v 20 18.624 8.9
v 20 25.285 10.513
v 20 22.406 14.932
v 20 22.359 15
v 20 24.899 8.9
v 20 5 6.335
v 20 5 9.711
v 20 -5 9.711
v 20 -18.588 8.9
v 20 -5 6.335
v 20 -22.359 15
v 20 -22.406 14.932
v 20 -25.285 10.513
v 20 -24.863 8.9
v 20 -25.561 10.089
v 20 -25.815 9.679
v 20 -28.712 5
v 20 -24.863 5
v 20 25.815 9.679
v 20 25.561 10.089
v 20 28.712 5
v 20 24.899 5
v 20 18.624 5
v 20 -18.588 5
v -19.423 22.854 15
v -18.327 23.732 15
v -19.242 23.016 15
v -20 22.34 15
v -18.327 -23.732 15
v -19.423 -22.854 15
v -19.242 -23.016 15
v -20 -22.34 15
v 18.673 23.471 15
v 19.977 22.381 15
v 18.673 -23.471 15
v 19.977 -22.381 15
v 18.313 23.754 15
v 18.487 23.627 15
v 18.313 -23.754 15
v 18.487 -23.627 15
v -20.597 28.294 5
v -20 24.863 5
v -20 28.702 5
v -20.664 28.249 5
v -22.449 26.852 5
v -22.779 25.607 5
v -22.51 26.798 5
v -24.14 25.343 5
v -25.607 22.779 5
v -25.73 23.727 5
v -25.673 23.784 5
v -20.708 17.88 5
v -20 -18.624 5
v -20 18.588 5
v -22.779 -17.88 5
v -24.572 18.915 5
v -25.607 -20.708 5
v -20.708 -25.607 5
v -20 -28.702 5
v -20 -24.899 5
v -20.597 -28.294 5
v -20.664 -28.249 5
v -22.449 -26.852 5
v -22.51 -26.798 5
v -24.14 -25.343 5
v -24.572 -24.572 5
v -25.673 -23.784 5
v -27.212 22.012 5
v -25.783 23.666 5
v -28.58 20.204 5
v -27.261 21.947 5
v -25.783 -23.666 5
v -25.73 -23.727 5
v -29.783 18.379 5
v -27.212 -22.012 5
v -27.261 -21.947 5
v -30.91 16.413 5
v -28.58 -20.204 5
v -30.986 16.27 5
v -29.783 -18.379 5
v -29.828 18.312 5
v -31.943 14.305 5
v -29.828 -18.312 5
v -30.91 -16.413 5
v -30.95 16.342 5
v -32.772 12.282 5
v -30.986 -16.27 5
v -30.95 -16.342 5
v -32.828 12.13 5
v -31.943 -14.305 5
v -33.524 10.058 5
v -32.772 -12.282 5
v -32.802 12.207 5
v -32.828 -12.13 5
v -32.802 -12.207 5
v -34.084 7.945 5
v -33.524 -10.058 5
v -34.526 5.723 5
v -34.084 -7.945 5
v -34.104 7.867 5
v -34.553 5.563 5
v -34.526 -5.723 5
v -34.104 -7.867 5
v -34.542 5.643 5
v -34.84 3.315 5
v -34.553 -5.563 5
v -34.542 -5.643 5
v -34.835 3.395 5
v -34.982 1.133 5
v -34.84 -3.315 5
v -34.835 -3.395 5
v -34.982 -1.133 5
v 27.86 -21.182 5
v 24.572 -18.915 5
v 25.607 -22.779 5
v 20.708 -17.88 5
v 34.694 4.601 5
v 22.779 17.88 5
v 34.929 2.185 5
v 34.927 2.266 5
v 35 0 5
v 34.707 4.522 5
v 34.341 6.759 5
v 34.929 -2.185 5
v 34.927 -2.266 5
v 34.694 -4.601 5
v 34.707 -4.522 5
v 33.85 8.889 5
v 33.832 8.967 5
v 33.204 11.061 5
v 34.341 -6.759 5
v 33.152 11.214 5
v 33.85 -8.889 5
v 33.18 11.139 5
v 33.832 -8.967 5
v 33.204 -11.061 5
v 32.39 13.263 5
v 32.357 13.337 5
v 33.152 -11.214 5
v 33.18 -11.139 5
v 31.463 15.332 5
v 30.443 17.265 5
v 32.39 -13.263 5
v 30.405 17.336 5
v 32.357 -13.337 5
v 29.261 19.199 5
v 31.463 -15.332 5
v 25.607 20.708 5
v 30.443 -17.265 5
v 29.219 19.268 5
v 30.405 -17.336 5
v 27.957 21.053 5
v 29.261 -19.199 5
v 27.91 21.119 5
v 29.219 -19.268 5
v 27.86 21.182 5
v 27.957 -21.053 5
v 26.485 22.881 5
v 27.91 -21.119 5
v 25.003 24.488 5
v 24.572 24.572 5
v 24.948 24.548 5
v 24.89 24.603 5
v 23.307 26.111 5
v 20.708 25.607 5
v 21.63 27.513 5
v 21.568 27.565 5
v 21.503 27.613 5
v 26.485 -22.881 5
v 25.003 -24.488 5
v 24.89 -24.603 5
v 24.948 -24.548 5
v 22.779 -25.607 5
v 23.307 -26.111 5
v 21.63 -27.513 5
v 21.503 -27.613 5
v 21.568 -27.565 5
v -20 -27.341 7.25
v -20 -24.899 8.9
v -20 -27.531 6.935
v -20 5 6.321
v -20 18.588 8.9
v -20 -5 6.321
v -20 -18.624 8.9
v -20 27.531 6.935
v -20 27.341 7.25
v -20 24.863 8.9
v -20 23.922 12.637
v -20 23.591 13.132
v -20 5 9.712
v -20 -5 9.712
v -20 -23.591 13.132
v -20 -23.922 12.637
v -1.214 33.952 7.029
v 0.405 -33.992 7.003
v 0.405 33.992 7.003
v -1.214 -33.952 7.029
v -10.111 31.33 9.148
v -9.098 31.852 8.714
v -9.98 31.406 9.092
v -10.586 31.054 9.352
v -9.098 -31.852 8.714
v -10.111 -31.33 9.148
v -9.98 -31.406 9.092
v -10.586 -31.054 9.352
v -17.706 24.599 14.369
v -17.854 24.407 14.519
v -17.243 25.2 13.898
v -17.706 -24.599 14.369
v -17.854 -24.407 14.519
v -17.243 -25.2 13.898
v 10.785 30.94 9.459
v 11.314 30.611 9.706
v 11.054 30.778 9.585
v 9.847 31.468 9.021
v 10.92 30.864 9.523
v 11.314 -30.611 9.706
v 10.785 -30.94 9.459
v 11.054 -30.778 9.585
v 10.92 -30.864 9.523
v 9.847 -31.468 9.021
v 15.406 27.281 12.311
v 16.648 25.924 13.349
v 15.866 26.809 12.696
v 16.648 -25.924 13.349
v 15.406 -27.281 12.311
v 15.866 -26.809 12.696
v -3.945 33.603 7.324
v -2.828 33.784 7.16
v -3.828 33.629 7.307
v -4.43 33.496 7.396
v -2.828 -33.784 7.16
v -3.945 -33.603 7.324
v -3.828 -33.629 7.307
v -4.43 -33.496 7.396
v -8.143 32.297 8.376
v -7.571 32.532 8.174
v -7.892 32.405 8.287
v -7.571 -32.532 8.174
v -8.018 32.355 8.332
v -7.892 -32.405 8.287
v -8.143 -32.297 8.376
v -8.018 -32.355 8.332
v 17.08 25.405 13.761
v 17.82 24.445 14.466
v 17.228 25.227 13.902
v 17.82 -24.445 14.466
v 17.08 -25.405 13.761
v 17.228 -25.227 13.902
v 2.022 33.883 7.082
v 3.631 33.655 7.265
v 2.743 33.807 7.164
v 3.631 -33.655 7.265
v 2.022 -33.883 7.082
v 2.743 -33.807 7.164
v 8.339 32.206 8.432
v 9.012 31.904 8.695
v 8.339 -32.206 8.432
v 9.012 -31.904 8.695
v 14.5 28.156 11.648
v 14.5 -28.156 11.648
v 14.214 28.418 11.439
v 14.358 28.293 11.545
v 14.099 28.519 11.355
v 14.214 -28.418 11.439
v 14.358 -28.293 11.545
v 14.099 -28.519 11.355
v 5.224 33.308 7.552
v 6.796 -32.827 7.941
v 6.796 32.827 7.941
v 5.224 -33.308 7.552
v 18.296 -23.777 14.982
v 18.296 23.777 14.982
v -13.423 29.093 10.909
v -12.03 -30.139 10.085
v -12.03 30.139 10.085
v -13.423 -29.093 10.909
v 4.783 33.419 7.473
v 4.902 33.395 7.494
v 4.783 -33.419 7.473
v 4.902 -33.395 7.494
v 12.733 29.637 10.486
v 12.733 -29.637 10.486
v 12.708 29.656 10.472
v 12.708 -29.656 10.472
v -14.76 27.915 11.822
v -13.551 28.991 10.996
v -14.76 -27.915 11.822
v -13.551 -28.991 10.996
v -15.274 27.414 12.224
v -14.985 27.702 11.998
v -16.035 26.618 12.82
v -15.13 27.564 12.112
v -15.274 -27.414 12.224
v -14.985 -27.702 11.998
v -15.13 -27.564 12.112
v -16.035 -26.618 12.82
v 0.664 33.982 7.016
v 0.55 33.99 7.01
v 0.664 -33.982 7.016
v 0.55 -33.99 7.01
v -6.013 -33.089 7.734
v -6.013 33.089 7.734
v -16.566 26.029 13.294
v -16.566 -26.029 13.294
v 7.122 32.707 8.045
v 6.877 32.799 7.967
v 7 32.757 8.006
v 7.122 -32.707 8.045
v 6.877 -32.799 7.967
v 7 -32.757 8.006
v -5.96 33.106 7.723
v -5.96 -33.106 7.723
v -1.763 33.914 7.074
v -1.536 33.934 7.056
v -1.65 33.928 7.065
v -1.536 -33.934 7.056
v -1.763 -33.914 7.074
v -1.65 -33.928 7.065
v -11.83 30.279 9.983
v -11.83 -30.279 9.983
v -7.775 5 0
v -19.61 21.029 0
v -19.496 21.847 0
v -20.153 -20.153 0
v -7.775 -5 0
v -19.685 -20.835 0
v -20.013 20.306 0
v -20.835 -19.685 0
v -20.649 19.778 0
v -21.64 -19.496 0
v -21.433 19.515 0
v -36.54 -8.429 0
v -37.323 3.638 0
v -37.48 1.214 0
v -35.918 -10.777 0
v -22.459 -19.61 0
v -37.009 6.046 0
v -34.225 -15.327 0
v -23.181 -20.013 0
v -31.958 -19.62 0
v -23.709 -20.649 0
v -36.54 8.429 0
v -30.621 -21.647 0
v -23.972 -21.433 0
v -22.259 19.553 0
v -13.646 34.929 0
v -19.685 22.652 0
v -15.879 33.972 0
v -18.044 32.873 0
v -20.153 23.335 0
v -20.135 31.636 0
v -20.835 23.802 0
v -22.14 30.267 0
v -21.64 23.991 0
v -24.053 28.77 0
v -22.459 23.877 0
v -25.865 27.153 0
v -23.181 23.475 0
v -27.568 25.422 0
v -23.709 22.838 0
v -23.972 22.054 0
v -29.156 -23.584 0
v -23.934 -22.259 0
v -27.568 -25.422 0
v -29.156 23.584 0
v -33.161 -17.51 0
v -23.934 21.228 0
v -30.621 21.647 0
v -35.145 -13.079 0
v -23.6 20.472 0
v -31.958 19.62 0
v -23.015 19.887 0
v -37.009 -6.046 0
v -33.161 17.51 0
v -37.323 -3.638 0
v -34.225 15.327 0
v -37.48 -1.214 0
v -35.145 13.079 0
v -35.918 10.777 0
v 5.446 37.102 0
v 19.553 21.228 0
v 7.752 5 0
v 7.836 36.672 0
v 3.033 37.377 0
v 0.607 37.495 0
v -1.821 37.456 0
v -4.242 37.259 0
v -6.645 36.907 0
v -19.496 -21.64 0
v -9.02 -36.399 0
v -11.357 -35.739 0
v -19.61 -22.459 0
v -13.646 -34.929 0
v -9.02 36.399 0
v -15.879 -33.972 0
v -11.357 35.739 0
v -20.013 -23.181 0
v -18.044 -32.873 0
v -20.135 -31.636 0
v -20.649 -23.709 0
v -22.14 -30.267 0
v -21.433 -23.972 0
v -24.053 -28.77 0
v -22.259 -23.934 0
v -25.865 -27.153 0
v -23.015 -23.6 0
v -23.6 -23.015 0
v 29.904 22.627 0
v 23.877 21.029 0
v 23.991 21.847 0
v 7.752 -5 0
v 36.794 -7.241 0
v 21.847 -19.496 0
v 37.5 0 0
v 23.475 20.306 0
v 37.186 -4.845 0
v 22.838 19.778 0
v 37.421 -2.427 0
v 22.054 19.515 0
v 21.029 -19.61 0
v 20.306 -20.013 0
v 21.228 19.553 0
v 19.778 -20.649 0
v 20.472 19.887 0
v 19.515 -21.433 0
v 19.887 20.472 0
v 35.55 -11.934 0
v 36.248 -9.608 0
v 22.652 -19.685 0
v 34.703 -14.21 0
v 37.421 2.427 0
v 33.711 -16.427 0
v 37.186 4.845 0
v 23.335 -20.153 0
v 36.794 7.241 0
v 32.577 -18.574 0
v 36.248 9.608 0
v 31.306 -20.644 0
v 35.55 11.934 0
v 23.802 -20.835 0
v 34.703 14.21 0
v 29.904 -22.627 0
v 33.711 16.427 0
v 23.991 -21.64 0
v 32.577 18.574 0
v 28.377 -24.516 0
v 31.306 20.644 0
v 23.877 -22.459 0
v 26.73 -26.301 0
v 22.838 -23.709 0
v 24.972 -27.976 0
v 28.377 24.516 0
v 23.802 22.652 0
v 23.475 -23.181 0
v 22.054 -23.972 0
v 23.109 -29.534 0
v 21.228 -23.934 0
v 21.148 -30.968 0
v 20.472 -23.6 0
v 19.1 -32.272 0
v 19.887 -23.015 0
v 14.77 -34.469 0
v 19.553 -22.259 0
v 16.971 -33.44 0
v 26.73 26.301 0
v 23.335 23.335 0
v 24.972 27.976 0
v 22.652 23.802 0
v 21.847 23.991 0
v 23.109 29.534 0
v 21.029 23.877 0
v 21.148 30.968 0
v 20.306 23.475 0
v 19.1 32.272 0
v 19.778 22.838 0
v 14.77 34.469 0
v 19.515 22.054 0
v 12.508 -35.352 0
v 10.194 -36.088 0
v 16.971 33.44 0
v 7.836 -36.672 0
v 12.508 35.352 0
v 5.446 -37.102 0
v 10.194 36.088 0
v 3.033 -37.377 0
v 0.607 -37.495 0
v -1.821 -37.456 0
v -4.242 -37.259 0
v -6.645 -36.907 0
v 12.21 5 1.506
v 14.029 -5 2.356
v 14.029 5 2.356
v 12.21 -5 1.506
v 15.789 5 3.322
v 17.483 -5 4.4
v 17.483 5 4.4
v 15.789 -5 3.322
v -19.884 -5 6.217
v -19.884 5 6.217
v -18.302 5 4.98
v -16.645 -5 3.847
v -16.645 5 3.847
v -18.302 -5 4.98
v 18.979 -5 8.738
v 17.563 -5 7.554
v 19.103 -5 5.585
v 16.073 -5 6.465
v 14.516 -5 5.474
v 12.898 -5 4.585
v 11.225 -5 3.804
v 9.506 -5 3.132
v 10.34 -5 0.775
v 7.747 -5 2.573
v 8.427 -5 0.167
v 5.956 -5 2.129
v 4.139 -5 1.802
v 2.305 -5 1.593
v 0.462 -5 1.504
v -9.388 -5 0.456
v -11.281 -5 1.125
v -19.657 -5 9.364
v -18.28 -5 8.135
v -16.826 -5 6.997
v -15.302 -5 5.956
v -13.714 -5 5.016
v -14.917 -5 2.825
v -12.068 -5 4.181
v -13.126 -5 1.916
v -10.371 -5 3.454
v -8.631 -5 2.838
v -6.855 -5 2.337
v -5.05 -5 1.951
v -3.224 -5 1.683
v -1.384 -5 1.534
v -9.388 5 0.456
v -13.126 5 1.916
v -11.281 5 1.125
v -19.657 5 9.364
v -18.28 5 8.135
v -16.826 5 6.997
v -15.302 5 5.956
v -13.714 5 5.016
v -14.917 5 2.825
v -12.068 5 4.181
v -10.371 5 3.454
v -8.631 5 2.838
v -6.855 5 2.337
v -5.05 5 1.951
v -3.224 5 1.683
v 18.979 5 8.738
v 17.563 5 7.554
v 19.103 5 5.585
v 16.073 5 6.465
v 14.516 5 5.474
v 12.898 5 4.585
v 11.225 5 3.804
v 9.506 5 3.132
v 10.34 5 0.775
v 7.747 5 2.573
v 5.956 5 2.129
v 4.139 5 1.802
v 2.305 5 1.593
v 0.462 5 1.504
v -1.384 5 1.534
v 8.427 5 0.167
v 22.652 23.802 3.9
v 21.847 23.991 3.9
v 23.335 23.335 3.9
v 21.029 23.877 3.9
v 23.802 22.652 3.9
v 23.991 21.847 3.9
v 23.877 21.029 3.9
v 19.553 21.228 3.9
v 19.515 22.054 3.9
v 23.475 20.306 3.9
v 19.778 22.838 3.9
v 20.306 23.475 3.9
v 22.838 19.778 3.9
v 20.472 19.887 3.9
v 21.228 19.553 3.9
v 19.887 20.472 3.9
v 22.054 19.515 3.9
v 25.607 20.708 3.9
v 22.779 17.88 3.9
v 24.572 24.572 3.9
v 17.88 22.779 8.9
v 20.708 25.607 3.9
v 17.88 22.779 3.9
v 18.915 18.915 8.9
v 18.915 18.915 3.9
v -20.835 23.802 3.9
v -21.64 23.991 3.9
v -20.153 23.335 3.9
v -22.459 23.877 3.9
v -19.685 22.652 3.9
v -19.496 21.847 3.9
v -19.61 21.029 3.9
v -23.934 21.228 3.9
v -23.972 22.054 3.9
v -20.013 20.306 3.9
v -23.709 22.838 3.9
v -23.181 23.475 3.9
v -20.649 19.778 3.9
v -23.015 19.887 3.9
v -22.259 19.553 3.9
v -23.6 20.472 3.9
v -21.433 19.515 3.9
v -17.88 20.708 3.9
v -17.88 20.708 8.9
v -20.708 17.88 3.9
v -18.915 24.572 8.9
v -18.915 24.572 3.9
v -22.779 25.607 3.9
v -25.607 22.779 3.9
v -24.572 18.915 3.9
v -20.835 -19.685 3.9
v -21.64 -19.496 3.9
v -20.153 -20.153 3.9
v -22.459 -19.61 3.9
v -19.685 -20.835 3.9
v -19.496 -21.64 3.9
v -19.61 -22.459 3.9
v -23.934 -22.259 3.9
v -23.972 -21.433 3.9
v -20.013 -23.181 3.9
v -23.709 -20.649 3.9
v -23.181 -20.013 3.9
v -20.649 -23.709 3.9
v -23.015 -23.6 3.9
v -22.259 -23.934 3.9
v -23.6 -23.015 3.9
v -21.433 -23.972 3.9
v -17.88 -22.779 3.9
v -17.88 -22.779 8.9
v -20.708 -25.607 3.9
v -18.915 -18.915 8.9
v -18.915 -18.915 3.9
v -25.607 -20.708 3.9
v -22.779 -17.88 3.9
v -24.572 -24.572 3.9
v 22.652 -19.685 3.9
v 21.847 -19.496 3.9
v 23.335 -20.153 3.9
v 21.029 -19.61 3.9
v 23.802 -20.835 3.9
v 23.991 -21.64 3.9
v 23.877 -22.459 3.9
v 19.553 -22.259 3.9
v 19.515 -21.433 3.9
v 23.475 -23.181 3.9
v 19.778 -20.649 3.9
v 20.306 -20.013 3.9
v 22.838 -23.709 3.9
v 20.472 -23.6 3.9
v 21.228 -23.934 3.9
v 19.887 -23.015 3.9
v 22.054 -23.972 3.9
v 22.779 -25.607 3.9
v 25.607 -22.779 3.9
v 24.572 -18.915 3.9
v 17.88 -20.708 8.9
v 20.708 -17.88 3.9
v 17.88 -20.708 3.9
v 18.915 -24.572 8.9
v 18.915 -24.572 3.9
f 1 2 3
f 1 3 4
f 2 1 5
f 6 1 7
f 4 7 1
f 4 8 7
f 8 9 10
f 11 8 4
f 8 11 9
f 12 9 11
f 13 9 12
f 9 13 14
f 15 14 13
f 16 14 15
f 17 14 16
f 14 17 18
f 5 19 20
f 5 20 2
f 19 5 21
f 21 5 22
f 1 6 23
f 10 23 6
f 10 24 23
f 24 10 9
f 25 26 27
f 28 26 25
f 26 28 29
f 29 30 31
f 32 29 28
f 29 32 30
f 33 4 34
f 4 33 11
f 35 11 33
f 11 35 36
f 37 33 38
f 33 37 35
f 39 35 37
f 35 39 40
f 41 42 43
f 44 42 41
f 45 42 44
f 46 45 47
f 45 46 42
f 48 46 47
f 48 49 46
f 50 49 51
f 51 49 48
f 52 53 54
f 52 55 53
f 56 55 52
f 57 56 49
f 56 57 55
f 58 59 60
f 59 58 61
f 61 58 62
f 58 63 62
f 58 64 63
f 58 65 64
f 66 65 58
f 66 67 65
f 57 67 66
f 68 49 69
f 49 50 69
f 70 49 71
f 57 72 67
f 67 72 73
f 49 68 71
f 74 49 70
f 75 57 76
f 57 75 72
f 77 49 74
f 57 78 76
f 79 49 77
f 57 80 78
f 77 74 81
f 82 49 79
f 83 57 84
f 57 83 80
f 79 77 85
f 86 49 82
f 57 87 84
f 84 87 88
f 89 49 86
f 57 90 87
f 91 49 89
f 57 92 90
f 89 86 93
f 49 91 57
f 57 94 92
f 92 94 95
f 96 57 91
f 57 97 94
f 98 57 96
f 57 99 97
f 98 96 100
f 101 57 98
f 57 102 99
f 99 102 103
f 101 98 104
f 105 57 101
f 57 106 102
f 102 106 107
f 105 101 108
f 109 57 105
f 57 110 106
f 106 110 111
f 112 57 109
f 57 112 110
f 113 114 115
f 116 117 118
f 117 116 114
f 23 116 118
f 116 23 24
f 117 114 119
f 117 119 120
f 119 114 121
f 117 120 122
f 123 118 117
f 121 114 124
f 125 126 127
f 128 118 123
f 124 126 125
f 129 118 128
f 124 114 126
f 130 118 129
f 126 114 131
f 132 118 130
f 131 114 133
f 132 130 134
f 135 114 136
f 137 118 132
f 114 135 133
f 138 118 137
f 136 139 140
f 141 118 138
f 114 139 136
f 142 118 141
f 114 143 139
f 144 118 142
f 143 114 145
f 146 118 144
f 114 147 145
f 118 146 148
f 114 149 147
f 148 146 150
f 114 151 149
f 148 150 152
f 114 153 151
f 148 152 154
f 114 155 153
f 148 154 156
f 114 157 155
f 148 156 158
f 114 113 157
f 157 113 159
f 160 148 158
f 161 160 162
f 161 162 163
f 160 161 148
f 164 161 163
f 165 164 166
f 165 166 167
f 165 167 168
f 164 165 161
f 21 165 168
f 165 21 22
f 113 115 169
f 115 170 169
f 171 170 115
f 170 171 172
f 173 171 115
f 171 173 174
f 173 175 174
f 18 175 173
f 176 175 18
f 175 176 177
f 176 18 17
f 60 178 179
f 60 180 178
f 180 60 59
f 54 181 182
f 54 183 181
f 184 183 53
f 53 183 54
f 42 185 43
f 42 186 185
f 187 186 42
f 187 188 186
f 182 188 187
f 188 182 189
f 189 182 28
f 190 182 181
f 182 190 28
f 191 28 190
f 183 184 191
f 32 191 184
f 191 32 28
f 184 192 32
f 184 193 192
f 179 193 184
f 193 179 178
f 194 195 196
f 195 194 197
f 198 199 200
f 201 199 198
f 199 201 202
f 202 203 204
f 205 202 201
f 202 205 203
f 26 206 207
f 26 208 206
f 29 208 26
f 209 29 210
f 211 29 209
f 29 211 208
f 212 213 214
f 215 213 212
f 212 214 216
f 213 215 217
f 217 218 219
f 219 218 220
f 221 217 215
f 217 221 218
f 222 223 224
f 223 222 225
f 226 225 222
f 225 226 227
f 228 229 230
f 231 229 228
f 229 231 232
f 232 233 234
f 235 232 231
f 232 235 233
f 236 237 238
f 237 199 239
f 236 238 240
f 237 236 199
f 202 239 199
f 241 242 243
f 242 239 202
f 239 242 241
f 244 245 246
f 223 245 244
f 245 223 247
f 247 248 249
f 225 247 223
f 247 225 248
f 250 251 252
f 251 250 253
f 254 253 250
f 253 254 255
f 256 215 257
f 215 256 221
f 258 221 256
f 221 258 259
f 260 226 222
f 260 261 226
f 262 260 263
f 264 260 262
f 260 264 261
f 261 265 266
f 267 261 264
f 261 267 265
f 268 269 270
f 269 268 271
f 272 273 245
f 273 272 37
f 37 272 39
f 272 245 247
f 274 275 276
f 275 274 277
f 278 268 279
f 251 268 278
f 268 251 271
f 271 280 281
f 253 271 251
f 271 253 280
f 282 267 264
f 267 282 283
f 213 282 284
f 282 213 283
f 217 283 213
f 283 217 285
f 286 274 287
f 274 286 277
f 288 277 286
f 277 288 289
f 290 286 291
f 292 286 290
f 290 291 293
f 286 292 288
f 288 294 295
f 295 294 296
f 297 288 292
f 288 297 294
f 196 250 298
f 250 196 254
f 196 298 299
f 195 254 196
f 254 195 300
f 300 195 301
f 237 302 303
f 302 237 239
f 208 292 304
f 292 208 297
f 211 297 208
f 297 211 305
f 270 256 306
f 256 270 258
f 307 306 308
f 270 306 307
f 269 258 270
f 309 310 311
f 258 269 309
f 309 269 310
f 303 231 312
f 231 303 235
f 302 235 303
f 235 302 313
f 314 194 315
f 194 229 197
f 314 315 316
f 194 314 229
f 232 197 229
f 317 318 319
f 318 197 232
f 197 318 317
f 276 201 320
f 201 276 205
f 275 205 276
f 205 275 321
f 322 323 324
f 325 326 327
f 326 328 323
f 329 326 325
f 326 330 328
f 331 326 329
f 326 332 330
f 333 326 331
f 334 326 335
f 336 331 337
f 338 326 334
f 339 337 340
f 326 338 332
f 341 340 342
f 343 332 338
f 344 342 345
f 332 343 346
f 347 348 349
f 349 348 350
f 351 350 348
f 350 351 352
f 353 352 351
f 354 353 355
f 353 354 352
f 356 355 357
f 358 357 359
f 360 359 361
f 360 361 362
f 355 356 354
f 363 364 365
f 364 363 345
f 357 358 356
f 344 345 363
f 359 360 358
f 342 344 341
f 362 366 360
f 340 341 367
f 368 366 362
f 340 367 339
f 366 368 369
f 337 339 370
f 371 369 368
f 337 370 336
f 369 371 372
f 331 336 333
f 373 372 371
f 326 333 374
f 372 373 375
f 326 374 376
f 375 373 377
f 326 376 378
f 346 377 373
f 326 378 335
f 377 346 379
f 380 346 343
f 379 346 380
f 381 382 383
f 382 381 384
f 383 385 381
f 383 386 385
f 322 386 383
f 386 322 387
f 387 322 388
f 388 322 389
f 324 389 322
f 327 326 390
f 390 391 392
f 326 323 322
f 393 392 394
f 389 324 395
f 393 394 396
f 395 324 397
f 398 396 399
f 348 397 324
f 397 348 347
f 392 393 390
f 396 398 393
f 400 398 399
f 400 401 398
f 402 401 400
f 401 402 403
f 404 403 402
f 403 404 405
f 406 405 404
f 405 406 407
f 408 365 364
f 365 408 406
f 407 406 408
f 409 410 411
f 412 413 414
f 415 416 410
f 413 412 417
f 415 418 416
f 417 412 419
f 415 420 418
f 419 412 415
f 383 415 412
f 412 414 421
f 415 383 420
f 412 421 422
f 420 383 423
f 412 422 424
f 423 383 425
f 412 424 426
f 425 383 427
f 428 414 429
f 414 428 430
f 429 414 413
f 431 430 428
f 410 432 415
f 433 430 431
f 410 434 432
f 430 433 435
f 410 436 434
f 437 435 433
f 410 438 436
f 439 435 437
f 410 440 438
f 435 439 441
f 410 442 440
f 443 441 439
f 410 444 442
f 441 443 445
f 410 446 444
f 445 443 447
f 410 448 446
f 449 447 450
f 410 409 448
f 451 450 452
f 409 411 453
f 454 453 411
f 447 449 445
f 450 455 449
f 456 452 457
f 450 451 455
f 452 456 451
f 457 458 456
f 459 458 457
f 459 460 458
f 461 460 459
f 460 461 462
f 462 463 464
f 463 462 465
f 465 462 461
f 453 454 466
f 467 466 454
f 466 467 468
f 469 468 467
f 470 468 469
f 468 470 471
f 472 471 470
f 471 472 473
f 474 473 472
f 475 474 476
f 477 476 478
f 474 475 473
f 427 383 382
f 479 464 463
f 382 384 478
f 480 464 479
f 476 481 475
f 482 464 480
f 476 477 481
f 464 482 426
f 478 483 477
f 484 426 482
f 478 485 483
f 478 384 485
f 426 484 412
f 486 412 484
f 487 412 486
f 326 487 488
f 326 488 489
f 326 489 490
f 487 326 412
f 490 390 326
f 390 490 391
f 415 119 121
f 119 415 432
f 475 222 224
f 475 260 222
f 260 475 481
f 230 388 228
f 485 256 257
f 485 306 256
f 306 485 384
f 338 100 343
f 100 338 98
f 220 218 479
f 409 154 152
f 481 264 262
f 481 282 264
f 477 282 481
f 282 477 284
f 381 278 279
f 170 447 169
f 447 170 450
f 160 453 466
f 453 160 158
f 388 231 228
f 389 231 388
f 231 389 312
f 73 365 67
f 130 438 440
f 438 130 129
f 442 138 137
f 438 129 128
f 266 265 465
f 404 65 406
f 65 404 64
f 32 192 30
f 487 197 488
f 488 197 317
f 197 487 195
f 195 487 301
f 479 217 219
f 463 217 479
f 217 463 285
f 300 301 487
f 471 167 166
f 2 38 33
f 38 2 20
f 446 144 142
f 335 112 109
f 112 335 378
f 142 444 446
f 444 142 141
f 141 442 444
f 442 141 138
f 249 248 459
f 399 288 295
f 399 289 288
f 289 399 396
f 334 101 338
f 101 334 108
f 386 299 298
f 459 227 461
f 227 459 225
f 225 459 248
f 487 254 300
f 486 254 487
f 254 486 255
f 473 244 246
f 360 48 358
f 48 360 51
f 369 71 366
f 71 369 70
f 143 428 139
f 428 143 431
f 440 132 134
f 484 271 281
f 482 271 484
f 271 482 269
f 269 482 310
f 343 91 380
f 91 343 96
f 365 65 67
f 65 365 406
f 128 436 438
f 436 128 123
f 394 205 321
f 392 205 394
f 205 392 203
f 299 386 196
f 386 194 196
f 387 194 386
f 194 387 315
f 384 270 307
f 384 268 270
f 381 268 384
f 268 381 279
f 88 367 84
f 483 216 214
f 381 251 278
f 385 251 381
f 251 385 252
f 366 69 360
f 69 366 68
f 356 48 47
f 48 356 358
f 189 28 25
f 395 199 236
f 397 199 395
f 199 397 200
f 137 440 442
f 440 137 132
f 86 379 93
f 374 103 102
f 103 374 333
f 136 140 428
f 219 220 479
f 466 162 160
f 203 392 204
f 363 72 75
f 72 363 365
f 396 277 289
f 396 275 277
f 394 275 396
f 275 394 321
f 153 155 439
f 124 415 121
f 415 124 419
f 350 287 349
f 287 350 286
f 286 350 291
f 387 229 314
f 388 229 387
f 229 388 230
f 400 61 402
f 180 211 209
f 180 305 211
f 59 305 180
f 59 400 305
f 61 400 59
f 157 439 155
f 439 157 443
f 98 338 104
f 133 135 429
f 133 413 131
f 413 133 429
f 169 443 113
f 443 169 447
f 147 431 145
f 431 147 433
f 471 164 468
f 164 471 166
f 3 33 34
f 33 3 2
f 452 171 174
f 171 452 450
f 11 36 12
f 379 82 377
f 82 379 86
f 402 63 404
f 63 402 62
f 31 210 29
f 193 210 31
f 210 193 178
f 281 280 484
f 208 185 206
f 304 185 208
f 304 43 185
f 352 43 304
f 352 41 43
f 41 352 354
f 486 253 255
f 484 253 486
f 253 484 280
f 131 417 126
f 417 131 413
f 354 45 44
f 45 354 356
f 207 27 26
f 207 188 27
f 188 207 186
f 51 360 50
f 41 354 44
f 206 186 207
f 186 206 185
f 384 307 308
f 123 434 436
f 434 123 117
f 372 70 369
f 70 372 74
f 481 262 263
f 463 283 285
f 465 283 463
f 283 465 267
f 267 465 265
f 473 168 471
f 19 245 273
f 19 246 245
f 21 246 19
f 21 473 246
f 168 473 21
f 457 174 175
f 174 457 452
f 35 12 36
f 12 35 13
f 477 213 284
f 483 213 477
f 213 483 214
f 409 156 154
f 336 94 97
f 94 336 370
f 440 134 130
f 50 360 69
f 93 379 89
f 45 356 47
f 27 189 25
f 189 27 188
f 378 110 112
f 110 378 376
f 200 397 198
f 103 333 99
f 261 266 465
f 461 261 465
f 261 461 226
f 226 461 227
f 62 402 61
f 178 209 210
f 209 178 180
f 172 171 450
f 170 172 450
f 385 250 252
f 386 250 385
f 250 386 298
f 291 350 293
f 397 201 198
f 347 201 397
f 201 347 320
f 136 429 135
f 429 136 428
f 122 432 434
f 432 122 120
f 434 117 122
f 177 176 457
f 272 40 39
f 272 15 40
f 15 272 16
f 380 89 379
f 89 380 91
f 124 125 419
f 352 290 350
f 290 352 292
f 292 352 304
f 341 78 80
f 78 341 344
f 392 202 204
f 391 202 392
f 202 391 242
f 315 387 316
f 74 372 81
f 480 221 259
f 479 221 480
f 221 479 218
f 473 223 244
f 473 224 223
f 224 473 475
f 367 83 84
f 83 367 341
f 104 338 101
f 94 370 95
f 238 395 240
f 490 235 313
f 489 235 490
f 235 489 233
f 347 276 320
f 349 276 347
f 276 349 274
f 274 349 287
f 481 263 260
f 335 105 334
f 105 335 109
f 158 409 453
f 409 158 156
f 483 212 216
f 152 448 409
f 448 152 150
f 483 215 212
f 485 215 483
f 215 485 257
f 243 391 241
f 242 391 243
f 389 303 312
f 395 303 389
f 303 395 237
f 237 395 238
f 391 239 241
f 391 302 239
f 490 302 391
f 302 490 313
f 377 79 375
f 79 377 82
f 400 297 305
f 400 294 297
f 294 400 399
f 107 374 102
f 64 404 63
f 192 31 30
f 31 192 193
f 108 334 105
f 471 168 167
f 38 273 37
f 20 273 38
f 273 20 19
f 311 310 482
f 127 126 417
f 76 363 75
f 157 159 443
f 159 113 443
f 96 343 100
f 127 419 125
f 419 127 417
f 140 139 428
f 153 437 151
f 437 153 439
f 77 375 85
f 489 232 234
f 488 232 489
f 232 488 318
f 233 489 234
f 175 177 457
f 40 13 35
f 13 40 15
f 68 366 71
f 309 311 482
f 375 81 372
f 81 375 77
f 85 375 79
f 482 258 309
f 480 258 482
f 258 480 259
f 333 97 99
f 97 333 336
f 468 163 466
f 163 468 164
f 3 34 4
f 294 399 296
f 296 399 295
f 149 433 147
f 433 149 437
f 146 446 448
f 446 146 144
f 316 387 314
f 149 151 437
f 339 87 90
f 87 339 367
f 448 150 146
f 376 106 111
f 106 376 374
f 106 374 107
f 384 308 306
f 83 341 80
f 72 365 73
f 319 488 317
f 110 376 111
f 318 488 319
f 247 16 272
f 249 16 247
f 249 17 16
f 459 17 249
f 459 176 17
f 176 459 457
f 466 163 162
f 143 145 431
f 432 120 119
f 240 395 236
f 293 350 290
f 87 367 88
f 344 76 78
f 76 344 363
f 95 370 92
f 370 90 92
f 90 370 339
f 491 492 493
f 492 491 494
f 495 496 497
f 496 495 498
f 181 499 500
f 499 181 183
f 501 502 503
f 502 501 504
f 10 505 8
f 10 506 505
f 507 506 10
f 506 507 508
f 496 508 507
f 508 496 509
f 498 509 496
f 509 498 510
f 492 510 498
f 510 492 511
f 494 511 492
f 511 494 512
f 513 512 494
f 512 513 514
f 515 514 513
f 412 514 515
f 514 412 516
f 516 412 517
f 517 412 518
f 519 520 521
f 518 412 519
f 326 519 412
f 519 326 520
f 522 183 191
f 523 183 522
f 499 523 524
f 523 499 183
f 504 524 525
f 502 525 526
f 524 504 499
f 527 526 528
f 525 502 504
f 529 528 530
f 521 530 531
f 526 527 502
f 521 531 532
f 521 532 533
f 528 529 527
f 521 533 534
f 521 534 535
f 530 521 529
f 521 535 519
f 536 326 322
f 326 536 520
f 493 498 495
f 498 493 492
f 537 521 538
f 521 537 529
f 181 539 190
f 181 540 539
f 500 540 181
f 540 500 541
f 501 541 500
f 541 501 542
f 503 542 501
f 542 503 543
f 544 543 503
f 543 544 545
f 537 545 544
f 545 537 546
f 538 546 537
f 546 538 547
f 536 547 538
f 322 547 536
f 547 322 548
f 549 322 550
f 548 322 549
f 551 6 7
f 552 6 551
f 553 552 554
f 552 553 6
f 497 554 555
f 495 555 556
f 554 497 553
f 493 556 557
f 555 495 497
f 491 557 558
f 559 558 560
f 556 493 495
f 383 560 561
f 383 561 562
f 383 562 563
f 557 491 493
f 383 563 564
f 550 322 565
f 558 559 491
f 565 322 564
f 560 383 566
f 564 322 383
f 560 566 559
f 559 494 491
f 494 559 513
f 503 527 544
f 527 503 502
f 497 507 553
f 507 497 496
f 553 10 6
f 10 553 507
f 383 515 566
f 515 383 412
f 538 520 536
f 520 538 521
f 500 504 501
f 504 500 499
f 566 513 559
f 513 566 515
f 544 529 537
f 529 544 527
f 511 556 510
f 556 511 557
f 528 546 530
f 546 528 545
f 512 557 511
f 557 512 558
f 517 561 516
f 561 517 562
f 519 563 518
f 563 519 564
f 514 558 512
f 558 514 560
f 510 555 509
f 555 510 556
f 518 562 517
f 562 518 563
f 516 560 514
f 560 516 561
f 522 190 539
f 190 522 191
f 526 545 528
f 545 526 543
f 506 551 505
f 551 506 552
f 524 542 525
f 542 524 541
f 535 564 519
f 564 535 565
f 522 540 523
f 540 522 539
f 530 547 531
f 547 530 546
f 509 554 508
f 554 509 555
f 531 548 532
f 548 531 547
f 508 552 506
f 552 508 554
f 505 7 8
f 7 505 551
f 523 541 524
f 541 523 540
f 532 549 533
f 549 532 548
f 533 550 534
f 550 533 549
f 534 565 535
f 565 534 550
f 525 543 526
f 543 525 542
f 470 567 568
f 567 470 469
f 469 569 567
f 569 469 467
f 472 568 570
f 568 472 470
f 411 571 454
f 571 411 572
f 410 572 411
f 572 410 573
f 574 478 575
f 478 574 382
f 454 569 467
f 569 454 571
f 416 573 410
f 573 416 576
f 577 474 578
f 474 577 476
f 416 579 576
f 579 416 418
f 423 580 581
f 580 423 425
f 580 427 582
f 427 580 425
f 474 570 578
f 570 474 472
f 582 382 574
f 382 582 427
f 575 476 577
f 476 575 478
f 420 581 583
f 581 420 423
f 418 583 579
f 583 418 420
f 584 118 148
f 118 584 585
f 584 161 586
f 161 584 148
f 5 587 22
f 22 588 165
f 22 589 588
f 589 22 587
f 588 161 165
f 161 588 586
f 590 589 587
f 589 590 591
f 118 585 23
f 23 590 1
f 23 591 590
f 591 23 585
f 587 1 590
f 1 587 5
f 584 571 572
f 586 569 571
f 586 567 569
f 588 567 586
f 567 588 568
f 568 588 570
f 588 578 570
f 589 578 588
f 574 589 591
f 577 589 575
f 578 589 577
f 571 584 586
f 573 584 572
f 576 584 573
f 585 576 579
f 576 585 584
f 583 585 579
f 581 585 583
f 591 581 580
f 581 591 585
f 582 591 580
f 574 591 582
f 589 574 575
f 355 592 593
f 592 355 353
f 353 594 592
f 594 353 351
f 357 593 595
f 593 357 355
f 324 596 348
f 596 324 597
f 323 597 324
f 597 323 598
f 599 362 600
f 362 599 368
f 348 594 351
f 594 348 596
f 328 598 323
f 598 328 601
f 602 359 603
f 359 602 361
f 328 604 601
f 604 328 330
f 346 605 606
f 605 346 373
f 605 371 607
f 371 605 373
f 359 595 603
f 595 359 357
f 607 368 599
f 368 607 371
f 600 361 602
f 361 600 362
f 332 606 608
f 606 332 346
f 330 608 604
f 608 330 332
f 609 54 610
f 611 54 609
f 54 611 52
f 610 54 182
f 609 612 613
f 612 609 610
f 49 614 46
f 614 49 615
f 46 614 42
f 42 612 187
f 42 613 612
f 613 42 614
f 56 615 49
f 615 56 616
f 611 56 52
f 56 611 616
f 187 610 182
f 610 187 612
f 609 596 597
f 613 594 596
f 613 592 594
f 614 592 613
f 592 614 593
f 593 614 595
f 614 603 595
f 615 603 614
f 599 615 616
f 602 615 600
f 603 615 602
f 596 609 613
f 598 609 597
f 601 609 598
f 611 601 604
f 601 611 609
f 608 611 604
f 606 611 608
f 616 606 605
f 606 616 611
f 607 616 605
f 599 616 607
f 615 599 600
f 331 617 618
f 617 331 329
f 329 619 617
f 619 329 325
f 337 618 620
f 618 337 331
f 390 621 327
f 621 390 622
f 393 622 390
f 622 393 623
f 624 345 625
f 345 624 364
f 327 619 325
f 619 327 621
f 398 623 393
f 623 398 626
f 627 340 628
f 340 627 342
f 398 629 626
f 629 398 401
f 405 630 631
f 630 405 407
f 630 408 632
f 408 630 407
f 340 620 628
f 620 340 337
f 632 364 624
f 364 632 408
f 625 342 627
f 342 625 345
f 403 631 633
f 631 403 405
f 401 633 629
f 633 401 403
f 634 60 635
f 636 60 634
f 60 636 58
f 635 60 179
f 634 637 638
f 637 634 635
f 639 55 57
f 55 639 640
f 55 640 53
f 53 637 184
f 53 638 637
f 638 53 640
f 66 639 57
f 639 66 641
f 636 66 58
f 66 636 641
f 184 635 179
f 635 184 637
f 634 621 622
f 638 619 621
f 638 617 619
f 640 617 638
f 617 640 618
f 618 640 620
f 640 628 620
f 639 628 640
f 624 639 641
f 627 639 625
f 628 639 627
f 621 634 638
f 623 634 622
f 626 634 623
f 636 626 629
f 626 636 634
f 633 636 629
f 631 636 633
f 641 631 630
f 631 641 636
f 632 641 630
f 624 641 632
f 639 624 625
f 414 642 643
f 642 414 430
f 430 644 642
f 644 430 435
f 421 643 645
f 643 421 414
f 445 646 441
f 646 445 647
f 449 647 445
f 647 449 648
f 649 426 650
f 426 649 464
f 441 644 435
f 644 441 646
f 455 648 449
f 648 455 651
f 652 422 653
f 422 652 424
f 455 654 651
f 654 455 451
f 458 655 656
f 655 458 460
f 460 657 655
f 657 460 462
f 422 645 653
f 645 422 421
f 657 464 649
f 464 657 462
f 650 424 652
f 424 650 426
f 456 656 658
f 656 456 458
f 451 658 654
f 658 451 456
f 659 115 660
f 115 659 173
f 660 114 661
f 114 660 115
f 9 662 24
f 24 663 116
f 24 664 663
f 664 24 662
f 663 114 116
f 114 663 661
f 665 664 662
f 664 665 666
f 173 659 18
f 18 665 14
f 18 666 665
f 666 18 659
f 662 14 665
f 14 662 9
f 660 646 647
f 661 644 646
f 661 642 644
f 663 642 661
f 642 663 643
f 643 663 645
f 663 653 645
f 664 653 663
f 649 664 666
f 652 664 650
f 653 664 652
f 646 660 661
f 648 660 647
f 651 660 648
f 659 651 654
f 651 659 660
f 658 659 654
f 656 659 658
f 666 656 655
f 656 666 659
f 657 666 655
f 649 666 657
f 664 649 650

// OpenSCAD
pipe_diameter=50; // [30, 40, 50, 60, 70]
rotated_mount=1; // [0, 1]

module mounting_holes() {
	dist = 61.5;

	// d=4 is too large, need something to hold or nuts
	translate([dist/2, 0, 0]) children();
	translate([0, dist/2, 0]) children();
	translate([-dist/2, 0, 0]) children();

	translate([0, -dist/2, 0]) children();
}

module wall_plate(pipe_diameter, do_rotate=1) {
	$fn=97;
	dist = 75;
	plate = 5;
	difference () {
		intersection() {
			cylinder(d1=dist, d2=dist-50, h=50, $fn=97);
		union() {
			cylinder(d=dist, h=plate, $fn=97);

			difference() {
				translate([0, 0, plate + 5])
				cube([40, 75, 10], center=true);
				translate([0, 0, 7 + pipe_diameter/2])
				rotate([90, 0, 0])
				cylinder(d=pipe_diameter, h=90, center=true);
			}
		}
		}

		translate([0, 0, plate + pipe_diameter/2])
		rotate([90,0,0])
		difference () {
			cylinder(d=pipe_diameter + 12, h=10, center=true);
			cylinder(d=pipe_diameter + 7, h=10, center=true);
		}

		rotate([0,0,45 * do_rotate])
		translate([0,0,-.1])
		mounting_holes() {
			cylinder(d=4.5, h=8, $fn=17);
			translate([0,0,plate-1])
			cylinder(d=8, h=5, $fn=6);
		}
	}

}


wall_plate(pipe_diameter, rotated_mount);
